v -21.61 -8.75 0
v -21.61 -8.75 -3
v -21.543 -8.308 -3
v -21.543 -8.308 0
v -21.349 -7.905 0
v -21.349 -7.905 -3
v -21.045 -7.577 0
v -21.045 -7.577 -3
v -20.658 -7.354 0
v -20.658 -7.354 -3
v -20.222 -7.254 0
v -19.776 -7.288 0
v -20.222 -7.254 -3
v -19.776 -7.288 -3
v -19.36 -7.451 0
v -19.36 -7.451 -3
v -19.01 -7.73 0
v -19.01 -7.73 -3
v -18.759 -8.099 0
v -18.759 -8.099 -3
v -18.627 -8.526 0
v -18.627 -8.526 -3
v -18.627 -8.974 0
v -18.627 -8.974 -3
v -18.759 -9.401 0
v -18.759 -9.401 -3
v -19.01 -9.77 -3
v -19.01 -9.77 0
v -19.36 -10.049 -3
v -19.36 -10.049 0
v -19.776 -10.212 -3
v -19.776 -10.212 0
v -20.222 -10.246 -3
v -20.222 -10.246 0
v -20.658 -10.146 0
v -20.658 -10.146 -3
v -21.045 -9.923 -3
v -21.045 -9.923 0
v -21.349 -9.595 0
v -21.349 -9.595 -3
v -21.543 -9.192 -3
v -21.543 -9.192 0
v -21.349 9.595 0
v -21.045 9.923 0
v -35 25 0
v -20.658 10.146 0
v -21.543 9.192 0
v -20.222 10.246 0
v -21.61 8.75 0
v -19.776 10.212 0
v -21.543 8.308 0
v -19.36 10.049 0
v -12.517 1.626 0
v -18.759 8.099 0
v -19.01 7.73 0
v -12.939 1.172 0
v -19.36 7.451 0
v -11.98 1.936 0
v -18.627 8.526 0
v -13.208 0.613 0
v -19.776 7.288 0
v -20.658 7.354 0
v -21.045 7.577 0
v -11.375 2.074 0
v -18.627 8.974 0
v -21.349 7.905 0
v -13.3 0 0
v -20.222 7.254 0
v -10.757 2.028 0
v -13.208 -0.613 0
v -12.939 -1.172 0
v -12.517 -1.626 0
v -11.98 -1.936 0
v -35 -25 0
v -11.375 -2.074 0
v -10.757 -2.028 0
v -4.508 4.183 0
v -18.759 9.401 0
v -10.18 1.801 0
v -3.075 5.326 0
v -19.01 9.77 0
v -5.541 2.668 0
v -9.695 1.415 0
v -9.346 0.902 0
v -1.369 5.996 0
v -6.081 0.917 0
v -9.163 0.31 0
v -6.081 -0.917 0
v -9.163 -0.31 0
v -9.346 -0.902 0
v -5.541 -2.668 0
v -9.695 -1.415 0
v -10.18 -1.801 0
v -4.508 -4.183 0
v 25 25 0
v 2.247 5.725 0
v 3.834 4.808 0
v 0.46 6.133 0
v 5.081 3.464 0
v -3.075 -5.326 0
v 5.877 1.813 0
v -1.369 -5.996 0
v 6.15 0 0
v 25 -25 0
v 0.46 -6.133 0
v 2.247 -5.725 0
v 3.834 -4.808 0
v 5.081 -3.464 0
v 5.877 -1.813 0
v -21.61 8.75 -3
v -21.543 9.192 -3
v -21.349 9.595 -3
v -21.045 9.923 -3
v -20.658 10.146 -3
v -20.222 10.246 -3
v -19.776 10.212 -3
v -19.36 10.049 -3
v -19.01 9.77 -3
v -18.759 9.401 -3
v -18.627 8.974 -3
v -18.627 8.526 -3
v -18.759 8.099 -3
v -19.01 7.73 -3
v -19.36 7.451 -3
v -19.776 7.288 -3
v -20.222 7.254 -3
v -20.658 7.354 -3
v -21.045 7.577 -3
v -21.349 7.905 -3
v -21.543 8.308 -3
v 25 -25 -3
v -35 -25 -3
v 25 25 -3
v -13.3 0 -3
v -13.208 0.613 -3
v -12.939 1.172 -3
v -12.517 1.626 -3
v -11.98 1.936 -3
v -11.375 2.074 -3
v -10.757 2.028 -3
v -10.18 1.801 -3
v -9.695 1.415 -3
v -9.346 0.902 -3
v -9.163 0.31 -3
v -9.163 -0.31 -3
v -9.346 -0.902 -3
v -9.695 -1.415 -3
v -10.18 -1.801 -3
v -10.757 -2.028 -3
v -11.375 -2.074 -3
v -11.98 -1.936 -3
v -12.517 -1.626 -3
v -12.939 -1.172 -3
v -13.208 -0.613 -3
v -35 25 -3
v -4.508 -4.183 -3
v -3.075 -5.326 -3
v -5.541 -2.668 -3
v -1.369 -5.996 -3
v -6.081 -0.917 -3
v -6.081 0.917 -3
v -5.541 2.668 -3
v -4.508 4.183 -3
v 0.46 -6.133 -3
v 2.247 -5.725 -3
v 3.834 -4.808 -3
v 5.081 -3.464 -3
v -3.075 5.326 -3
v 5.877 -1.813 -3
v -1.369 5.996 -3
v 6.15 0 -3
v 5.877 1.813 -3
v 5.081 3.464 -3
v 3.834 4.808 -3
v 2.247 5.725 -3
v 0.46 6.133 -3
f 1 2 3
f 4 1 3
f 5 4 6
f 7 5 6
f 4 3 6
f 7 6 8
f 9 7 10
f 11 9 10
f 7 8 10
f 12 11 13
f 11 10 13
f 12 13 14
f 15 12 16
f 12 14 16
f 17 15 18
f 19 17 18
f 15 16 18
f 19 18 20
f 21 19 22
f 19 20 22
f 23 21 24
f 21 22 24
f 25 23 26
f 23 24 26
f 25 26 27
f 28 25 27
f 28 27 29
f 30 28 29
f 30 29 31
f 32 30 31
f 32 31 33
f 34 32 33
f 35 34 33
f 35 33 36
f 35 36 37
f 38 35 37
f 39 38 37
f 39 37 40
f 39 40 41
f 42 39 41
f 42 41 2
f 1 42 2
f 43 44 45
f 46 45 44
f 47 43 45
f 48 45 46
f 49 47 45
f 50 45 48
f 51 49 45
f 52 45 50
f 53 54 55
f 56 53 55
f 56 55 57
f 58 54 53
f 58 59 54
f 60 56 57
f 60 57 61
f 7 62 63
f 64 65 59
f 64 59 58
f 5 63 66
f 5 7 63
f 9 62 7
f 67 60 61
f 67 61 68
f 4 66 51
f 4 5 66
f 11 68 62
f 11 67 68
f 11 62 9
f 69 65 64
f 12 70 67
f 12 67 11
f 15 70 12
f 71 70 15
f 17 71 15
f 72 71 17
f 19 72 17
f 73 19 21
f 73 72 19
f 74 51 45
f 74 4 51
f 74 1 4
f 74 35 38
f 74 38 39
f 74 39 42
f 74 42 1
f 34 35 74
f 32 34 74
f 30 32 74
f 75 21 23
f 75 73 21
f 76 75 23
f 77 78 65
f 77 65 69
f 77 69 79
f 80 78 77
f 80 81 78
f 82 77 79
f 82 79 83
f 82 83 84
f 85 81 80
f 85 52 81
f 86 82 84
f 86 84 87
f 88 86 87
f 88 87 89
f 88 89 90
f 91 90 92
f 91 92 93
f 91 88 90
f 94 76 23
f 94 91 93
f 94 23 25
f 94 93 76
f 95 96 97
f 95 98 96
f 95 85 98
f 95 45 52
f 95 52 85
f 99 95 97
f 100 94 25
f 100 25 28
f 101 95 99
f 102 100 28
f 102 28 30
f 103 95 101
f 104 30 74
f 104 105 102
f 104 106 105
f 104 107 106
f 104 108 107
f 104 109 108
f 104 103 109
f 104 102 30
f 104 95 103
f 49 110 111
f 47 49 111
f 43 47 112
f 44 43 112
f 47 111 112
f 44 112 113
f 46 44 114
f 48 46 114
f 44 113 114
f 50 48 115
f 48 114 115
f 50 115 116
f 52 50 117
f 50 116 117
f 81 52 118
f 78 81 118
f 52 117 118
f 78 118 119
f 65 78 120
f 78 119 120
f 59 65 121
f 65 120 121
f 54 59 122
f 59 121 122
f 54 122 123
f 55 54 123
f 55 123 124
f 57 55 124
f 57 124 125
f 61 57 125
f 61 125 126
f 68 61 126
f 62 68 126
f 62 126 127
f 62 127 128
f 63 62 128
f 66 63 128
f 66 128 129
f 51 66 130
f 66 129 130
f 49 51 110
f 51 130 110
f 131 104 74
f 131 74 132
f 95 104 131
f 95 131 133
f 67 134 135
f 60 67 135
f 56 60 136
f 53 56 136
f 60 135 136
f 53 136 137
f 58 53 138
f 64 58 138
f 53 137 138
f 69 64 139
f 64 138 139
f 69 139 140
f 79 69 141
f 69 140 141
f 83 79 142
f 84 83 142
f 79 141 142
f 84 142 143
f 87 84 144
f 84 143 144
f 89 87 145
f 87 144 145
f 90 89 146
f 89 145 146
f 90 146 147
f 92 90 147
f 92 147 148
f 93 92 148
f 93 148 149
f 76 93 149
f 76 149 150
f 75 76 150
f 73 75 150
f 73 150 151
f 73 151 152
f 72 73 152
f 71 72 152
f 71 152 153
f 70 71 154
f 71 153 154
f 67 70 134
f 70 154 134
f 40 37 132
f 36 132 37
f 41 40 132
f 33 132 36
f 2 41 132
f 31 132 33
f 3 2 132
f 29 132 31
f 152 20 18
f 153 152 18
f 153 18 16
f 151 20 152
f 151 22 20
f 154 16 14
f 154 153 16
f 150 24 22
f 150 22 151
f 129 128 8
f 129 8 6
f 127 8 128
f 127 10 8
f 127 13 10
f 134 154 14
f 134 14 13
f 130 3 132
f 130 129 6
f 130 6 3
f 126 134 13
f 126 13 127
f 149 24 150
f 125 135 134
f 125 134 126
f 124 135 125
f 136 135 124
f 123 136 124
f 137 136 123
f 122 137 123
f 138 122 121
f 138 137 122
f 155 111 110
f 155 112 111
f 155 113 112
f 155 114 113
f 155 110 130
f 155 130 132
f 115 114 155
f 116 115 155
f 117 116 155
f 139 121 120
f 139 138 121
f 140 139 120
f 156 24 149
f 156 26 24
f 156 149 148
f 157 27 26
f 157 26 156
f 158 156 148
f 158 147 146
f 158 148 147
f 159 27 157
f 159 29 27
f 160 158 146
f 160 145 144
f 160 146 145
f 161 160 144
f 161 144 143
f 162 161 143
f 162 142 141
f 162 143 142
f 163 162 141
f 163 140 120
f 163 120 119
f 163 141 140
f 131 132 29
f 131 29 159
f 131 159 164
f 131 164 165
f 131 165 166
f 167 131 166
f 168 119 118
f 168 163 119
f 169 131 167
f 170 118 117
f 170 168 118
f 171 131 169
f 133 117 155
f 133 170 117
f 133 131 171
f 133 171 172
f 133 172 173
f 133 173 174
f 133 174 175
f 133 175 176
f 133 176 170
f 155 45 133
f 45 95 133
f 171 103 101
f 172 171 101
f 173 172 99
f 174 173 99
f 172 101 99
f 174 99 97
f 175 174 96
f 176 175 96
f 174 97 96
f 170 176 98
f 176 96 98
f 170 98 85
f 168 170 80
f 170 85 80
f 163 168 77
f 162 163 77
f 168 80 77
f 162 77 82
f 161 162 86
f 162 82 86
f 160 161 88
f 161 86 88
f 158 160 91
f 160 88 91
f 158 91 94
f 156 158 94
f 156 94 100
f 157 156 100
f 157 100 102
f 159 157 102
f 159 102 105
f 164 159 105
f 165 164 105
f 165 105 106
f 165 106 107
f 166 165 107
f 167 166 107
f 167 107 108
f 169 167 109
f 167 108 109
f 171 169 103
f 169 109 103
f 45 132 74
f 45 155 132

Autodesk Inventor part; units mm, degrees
ref_plane "YZ Plane" through (0, 0, 0) normal (1, 0, 0) x (0, 1, 0)
ref_plane "XZ Plane" through (0, 0, 0) normal (0, 1, 0) x (-1, 0, 0)
ref_plane "XY Plane" through (0, 0, 0) normal (0, 0, 1) x (1, 0, 0)
sketch "Sketch1" plane through (0, 0, 0) normal (0, 0, 1) x (1, 0, 0)
  ellipse E0 centre (0, 0) end of major axis (0, 3.5) minor radius 3.5 projected
  arc A0 (-2.0076, 1.85) -> (-2.0076, -1.85) centre (0, 0) ccw projected
  line L0 (-2.0076, 1.85) -> (2.0076, 1.85) projected
  arc A1 (2.0076, -1.85) -> (2.0076, 1.85) centre (0, 0) ccw projected
  line L1 (2.0076, -1.85) -> (-2.0076, -1.85) projected
  line L2 (-50, -25) -> (50, -25)
  line L3 (50, -25) -> (50, 25)
  line L4 (50, 25) -> (-50, 25)
  line L5 (-50, 25) -> (-50, -25)
  line L6 (-50, -25) -> (50, 25) construction
  line L7 (50, -25) -> (-50, 25) construction
  line L8 (-25, -25) -> (-25, 25)
  line L9 (25, -25) -> (25, 25)
  circle A2 centre (0, 0) radius 6.15
  point P0 (0, 0)
  dimension "d0" = 100
  dimension "d1" = 50
  dimension "d4" = 25
  dimension "d5" = 50
  dimension "d10" = 12.3
extrude "Extrusion1" add sketch "Sketch1" against normal blind 3 contours L8 L4 L9 L2
sketch "Sketch2" plane through (0, 0, -3) normal (0, 0, -1) x (-1, 0, 0)
  circle A0 centre (20.11, -8.75) radius 1.5 projected
  circle A1 centre (11.22, 0) radius 2.08 projected
  circle A2 centre (20.11, 8.75) radius 1.5 projected
  point P0 (0, 0)
extrude "Extrusion2" cut sketch "Sketch2" against normal through all
sketch "Sketch3" plane through (-25, -25, 0) normal (-1, 0, 0) x (0, 0, 1)
  line L0 (0, 50) -> (0, 0) projected
  line L1 (0, 50) -> (-3, 50) projected
  line L2 (-3, 0) -> (-3, 50) projected
  line L3 (0, 0) -> (-3, 0) projected
  point P0 (0, 25)
extrude "Extrusion3" add sketch "Sketch3" along normal blind 10
sketch "Sketch4" plane through (0, 0, -3) normal (0, 0, -1) x (-1, 0, 0)
  circle A0 centre (20.11, -8.75) radius 1.5 projected
  circle A1 centre (20.11, 8.75) radius 1.5 projected
  point P0 (0, 0)
extrude "Extrusion4" cut sketch "Sketch4" against normal through all
properties part number "arm2"
